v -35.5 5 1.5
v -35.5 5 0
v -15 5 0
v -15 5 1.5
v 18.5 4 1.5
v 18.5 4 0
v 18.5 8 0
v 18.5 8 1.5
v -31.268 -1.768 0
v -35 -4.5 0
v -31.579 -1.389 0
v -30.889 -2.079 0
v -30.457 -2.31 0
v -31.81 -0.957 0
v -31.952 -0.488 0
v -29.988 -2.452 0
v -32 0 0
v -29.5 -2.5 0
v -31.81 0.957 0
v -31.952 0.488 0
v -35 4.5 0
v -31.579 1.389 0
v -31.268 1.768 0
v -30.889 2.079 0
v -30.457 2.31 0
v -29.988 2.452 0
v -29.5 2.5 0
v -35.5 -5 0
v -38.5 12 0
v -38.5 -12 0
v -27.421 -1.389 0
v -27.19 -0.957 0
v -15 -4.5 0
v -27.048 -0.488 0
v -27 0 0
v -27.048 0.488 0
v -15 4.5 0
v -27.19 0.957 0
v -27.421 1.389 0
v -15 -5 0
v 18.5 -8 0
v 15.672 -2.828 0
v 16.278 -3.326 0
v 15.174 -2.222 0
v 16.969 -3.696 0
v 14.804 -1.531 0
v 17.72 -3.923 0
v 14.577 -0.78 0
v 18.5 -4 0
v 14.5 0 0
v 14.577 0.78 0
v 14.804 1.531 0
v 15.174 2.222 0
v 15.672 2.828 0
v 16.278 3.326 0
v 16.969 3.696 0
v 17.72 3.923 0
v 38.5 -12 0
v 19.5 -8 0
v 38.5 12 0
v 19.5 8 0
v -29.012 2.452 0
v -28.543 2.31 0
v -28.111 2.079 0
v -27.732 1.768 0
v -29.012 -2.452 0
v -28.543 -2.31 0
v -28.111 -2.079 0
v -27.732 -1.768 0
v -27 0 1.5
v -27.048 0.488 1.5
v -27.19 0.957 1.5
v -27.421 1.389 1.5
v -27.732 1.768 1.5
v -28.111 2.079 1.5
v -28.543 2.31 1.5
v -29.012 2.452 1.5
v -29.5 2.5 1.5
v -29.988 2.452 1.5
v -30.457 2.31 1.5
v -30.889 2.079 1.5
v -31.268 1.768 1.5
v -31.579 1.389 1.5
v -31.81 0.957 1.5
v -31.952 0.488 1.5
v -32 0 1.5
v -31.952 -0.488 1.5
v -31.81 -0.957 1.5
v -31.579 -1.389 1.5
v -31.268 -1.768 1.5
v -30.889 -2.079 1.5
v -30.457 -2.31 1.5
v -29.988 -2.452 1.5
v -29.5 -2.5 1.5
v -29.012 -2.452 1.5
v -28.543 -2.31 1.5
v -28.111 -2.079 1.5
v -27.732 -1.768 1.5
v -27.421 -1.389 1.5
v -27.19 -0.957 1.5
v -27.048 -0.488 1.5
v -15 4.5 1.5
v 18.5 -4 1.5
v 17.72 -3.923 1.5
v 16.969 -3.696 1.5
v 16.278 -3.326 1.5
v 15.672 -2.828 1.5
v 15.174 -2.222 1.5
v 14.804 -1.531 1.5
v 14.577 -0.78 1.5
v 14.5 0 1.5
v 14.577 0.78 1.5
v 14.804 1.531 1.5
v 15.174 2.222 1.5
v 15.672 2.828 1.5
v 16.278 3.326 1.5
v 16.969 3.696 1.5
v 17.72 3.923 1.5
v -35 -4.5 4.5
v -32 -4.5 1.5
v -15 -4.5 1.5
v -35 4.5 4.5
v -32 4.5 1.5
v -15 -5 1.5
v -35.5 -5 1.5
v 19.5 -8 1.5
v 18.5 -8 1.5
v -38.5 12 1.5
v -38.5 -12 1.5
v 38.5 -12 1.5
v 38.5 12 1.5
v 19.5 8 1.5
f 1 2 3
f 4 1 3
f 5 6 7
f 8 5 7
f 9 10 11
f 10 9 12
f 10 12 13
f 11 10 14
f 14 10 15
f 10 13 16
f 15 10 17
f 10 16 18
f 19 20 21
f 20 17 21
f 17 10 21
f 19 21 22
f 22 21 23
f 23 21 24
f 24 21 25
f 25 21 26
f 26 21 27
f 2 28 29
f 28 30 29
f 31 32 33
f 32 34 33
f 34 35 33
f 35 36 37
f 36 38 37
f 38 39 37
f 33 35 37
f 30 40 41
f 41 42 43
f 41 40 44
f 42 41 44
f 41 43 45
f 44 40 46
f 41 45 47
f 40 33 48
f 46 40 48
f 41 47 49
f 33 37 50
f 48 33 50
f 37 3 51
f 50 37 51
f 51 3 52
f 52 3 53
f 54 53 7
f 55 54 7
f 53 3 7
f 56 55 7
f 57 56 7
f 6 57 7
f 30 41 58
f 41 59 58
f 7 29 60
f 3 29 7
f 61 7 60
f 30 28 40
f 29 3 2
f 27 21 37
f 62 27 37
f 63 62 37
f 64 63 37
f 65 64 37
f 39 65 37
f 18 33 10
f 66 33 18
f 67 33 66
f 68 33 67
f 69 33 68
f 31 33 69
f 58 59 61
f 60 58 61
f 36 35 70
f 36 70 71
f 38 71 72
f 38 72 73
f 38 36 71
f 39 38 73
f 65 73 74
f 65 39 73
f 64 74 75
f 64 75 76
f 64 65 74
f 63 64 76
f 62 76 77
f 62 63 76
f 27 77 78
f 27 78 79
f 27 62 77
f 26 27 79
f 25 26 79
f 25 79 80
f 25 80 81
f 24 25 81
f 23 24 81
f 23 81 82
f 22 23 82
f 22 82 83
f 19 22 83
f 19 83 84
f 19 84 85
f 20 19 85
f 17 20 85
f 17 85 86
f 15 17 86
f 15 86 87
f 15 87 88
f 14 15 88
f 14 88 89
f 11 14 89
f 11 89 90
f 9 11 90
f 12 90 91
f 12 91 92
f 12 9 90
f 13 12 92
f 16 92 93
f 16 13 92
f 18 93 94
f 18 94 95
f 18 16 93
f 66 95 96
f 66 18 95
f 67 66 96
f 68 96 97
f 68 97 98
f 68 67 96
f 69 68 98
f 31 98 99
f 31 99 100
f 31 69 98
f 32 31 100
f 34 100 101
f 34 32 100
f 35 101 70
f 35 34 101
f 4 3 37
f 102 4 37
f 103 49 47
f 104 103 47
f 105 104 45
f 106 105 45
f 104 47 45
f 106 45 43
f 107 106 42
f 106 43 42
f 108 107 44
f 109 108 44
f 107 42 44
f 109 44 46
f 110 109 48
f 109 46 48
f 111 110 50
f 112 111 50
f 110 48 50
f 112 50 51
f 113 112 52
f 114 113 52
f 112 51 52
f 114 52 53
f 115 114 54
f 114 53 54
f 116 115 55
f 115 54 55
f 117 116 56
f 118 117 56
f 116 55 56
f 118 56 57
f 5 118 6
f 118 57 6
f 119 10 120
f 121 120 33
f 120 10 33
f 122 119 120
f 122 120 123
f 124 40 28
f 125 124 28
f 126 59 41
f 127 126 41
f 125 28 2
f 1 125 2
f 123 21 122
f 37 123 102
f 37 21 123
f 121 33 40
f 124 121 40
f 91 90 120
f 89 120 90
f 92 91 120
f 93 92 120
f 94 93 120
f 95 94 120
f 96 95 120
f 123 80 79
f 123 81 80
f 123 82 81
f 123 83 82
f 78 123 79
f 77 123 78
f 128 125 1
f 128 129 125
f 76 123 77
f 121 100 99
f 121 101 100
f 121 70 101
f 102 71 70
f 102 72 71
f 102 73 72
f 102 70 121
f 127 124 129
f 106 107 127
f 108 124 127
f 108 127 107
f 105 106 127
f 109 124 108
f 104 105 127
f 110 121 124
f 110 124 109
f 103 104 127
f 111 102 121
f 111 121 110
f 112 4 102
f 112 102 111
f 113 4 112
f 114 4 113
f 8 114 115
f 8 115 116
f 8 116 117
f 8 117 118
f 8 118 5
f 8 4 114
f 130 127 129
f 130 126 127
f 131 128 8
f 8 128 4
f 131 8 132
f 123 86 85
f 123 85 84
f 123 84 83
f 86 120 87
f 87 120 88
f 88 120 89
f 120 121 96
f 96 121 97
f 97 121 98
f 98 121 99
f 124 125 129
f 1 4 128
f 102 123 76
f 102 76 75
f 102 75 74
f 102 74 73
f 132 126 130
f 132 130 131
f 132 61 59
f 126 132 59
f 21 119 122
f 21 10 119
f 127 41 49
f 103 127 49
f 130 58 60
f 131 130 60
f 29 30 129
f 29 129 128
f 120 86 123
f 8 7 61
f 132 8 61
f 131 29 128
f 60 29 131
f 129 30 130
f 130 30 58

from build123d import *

# Parameters (mm, degrees)
F0_W     = 77
F0_H     = 24
F0_R     = 2.5
F1_DEPTH = 1.5
F2_W     = 3
F2_H     = 9
F3_DEPTH = 3
F4_SIZE  = 2.99999


# Not quite as in the source:
# - a fillet or chamfer is up to 0.001 mm smaller than in the source, because OpenCascade refuses the exact size


with BuildPart() as f1:
    # F0 (on Top) → F1 (new body)
    with BuildSketch(Plane.XY):
        Rectangle(F0_W, F0_H)
        with Locations((-29.5, 0)):
            Circle(F0_R, mode=Mode.SUBTRACT)
        Polygon((-35.5, -5), (-35.5, 5), (-15, 5), (-15, 4.5), (-35, 4.5), (-35, -4.5), (-15, -4.5), (-15, -5), align=None, mode=Mode.SUBTRACT)
        with BuildLine():
            Line((18.5, 4), (18.5, 8))
            Line((18.5, 8), (19.5, 8))
            Line((19.5, 8), (19.5, -8))
            Line((19.5, -8), (18.5, -8))
            Line((18.5, -8), (18.5, -4))
            ThreePointArc((18.5, -4), (14.5, 0), (18.5, 4))
        make_face(mode=Mode.SUBTRACT)
    extrude(amount=F1_DEPTH)

    # F2 (on face) → F3 (join)
    with BuildSketch(Plane.XY.offset(1.5)):
        with Locations((-33.5, 0)):
            Rectangle(F2_W, F2_H)
    extrude(amount=F3_DEPTH)

    # F4 (size 3 in the source; OpenCascade refuses exactly that, so slightly less here)
    f4_edges = [f1.edges().sort_by_distance(p)[0] for p in [
        (-32, 0, 4.5),
    ]]
    chamfer(f4_edges, length=F4_SIZE)


solid = f1.part
